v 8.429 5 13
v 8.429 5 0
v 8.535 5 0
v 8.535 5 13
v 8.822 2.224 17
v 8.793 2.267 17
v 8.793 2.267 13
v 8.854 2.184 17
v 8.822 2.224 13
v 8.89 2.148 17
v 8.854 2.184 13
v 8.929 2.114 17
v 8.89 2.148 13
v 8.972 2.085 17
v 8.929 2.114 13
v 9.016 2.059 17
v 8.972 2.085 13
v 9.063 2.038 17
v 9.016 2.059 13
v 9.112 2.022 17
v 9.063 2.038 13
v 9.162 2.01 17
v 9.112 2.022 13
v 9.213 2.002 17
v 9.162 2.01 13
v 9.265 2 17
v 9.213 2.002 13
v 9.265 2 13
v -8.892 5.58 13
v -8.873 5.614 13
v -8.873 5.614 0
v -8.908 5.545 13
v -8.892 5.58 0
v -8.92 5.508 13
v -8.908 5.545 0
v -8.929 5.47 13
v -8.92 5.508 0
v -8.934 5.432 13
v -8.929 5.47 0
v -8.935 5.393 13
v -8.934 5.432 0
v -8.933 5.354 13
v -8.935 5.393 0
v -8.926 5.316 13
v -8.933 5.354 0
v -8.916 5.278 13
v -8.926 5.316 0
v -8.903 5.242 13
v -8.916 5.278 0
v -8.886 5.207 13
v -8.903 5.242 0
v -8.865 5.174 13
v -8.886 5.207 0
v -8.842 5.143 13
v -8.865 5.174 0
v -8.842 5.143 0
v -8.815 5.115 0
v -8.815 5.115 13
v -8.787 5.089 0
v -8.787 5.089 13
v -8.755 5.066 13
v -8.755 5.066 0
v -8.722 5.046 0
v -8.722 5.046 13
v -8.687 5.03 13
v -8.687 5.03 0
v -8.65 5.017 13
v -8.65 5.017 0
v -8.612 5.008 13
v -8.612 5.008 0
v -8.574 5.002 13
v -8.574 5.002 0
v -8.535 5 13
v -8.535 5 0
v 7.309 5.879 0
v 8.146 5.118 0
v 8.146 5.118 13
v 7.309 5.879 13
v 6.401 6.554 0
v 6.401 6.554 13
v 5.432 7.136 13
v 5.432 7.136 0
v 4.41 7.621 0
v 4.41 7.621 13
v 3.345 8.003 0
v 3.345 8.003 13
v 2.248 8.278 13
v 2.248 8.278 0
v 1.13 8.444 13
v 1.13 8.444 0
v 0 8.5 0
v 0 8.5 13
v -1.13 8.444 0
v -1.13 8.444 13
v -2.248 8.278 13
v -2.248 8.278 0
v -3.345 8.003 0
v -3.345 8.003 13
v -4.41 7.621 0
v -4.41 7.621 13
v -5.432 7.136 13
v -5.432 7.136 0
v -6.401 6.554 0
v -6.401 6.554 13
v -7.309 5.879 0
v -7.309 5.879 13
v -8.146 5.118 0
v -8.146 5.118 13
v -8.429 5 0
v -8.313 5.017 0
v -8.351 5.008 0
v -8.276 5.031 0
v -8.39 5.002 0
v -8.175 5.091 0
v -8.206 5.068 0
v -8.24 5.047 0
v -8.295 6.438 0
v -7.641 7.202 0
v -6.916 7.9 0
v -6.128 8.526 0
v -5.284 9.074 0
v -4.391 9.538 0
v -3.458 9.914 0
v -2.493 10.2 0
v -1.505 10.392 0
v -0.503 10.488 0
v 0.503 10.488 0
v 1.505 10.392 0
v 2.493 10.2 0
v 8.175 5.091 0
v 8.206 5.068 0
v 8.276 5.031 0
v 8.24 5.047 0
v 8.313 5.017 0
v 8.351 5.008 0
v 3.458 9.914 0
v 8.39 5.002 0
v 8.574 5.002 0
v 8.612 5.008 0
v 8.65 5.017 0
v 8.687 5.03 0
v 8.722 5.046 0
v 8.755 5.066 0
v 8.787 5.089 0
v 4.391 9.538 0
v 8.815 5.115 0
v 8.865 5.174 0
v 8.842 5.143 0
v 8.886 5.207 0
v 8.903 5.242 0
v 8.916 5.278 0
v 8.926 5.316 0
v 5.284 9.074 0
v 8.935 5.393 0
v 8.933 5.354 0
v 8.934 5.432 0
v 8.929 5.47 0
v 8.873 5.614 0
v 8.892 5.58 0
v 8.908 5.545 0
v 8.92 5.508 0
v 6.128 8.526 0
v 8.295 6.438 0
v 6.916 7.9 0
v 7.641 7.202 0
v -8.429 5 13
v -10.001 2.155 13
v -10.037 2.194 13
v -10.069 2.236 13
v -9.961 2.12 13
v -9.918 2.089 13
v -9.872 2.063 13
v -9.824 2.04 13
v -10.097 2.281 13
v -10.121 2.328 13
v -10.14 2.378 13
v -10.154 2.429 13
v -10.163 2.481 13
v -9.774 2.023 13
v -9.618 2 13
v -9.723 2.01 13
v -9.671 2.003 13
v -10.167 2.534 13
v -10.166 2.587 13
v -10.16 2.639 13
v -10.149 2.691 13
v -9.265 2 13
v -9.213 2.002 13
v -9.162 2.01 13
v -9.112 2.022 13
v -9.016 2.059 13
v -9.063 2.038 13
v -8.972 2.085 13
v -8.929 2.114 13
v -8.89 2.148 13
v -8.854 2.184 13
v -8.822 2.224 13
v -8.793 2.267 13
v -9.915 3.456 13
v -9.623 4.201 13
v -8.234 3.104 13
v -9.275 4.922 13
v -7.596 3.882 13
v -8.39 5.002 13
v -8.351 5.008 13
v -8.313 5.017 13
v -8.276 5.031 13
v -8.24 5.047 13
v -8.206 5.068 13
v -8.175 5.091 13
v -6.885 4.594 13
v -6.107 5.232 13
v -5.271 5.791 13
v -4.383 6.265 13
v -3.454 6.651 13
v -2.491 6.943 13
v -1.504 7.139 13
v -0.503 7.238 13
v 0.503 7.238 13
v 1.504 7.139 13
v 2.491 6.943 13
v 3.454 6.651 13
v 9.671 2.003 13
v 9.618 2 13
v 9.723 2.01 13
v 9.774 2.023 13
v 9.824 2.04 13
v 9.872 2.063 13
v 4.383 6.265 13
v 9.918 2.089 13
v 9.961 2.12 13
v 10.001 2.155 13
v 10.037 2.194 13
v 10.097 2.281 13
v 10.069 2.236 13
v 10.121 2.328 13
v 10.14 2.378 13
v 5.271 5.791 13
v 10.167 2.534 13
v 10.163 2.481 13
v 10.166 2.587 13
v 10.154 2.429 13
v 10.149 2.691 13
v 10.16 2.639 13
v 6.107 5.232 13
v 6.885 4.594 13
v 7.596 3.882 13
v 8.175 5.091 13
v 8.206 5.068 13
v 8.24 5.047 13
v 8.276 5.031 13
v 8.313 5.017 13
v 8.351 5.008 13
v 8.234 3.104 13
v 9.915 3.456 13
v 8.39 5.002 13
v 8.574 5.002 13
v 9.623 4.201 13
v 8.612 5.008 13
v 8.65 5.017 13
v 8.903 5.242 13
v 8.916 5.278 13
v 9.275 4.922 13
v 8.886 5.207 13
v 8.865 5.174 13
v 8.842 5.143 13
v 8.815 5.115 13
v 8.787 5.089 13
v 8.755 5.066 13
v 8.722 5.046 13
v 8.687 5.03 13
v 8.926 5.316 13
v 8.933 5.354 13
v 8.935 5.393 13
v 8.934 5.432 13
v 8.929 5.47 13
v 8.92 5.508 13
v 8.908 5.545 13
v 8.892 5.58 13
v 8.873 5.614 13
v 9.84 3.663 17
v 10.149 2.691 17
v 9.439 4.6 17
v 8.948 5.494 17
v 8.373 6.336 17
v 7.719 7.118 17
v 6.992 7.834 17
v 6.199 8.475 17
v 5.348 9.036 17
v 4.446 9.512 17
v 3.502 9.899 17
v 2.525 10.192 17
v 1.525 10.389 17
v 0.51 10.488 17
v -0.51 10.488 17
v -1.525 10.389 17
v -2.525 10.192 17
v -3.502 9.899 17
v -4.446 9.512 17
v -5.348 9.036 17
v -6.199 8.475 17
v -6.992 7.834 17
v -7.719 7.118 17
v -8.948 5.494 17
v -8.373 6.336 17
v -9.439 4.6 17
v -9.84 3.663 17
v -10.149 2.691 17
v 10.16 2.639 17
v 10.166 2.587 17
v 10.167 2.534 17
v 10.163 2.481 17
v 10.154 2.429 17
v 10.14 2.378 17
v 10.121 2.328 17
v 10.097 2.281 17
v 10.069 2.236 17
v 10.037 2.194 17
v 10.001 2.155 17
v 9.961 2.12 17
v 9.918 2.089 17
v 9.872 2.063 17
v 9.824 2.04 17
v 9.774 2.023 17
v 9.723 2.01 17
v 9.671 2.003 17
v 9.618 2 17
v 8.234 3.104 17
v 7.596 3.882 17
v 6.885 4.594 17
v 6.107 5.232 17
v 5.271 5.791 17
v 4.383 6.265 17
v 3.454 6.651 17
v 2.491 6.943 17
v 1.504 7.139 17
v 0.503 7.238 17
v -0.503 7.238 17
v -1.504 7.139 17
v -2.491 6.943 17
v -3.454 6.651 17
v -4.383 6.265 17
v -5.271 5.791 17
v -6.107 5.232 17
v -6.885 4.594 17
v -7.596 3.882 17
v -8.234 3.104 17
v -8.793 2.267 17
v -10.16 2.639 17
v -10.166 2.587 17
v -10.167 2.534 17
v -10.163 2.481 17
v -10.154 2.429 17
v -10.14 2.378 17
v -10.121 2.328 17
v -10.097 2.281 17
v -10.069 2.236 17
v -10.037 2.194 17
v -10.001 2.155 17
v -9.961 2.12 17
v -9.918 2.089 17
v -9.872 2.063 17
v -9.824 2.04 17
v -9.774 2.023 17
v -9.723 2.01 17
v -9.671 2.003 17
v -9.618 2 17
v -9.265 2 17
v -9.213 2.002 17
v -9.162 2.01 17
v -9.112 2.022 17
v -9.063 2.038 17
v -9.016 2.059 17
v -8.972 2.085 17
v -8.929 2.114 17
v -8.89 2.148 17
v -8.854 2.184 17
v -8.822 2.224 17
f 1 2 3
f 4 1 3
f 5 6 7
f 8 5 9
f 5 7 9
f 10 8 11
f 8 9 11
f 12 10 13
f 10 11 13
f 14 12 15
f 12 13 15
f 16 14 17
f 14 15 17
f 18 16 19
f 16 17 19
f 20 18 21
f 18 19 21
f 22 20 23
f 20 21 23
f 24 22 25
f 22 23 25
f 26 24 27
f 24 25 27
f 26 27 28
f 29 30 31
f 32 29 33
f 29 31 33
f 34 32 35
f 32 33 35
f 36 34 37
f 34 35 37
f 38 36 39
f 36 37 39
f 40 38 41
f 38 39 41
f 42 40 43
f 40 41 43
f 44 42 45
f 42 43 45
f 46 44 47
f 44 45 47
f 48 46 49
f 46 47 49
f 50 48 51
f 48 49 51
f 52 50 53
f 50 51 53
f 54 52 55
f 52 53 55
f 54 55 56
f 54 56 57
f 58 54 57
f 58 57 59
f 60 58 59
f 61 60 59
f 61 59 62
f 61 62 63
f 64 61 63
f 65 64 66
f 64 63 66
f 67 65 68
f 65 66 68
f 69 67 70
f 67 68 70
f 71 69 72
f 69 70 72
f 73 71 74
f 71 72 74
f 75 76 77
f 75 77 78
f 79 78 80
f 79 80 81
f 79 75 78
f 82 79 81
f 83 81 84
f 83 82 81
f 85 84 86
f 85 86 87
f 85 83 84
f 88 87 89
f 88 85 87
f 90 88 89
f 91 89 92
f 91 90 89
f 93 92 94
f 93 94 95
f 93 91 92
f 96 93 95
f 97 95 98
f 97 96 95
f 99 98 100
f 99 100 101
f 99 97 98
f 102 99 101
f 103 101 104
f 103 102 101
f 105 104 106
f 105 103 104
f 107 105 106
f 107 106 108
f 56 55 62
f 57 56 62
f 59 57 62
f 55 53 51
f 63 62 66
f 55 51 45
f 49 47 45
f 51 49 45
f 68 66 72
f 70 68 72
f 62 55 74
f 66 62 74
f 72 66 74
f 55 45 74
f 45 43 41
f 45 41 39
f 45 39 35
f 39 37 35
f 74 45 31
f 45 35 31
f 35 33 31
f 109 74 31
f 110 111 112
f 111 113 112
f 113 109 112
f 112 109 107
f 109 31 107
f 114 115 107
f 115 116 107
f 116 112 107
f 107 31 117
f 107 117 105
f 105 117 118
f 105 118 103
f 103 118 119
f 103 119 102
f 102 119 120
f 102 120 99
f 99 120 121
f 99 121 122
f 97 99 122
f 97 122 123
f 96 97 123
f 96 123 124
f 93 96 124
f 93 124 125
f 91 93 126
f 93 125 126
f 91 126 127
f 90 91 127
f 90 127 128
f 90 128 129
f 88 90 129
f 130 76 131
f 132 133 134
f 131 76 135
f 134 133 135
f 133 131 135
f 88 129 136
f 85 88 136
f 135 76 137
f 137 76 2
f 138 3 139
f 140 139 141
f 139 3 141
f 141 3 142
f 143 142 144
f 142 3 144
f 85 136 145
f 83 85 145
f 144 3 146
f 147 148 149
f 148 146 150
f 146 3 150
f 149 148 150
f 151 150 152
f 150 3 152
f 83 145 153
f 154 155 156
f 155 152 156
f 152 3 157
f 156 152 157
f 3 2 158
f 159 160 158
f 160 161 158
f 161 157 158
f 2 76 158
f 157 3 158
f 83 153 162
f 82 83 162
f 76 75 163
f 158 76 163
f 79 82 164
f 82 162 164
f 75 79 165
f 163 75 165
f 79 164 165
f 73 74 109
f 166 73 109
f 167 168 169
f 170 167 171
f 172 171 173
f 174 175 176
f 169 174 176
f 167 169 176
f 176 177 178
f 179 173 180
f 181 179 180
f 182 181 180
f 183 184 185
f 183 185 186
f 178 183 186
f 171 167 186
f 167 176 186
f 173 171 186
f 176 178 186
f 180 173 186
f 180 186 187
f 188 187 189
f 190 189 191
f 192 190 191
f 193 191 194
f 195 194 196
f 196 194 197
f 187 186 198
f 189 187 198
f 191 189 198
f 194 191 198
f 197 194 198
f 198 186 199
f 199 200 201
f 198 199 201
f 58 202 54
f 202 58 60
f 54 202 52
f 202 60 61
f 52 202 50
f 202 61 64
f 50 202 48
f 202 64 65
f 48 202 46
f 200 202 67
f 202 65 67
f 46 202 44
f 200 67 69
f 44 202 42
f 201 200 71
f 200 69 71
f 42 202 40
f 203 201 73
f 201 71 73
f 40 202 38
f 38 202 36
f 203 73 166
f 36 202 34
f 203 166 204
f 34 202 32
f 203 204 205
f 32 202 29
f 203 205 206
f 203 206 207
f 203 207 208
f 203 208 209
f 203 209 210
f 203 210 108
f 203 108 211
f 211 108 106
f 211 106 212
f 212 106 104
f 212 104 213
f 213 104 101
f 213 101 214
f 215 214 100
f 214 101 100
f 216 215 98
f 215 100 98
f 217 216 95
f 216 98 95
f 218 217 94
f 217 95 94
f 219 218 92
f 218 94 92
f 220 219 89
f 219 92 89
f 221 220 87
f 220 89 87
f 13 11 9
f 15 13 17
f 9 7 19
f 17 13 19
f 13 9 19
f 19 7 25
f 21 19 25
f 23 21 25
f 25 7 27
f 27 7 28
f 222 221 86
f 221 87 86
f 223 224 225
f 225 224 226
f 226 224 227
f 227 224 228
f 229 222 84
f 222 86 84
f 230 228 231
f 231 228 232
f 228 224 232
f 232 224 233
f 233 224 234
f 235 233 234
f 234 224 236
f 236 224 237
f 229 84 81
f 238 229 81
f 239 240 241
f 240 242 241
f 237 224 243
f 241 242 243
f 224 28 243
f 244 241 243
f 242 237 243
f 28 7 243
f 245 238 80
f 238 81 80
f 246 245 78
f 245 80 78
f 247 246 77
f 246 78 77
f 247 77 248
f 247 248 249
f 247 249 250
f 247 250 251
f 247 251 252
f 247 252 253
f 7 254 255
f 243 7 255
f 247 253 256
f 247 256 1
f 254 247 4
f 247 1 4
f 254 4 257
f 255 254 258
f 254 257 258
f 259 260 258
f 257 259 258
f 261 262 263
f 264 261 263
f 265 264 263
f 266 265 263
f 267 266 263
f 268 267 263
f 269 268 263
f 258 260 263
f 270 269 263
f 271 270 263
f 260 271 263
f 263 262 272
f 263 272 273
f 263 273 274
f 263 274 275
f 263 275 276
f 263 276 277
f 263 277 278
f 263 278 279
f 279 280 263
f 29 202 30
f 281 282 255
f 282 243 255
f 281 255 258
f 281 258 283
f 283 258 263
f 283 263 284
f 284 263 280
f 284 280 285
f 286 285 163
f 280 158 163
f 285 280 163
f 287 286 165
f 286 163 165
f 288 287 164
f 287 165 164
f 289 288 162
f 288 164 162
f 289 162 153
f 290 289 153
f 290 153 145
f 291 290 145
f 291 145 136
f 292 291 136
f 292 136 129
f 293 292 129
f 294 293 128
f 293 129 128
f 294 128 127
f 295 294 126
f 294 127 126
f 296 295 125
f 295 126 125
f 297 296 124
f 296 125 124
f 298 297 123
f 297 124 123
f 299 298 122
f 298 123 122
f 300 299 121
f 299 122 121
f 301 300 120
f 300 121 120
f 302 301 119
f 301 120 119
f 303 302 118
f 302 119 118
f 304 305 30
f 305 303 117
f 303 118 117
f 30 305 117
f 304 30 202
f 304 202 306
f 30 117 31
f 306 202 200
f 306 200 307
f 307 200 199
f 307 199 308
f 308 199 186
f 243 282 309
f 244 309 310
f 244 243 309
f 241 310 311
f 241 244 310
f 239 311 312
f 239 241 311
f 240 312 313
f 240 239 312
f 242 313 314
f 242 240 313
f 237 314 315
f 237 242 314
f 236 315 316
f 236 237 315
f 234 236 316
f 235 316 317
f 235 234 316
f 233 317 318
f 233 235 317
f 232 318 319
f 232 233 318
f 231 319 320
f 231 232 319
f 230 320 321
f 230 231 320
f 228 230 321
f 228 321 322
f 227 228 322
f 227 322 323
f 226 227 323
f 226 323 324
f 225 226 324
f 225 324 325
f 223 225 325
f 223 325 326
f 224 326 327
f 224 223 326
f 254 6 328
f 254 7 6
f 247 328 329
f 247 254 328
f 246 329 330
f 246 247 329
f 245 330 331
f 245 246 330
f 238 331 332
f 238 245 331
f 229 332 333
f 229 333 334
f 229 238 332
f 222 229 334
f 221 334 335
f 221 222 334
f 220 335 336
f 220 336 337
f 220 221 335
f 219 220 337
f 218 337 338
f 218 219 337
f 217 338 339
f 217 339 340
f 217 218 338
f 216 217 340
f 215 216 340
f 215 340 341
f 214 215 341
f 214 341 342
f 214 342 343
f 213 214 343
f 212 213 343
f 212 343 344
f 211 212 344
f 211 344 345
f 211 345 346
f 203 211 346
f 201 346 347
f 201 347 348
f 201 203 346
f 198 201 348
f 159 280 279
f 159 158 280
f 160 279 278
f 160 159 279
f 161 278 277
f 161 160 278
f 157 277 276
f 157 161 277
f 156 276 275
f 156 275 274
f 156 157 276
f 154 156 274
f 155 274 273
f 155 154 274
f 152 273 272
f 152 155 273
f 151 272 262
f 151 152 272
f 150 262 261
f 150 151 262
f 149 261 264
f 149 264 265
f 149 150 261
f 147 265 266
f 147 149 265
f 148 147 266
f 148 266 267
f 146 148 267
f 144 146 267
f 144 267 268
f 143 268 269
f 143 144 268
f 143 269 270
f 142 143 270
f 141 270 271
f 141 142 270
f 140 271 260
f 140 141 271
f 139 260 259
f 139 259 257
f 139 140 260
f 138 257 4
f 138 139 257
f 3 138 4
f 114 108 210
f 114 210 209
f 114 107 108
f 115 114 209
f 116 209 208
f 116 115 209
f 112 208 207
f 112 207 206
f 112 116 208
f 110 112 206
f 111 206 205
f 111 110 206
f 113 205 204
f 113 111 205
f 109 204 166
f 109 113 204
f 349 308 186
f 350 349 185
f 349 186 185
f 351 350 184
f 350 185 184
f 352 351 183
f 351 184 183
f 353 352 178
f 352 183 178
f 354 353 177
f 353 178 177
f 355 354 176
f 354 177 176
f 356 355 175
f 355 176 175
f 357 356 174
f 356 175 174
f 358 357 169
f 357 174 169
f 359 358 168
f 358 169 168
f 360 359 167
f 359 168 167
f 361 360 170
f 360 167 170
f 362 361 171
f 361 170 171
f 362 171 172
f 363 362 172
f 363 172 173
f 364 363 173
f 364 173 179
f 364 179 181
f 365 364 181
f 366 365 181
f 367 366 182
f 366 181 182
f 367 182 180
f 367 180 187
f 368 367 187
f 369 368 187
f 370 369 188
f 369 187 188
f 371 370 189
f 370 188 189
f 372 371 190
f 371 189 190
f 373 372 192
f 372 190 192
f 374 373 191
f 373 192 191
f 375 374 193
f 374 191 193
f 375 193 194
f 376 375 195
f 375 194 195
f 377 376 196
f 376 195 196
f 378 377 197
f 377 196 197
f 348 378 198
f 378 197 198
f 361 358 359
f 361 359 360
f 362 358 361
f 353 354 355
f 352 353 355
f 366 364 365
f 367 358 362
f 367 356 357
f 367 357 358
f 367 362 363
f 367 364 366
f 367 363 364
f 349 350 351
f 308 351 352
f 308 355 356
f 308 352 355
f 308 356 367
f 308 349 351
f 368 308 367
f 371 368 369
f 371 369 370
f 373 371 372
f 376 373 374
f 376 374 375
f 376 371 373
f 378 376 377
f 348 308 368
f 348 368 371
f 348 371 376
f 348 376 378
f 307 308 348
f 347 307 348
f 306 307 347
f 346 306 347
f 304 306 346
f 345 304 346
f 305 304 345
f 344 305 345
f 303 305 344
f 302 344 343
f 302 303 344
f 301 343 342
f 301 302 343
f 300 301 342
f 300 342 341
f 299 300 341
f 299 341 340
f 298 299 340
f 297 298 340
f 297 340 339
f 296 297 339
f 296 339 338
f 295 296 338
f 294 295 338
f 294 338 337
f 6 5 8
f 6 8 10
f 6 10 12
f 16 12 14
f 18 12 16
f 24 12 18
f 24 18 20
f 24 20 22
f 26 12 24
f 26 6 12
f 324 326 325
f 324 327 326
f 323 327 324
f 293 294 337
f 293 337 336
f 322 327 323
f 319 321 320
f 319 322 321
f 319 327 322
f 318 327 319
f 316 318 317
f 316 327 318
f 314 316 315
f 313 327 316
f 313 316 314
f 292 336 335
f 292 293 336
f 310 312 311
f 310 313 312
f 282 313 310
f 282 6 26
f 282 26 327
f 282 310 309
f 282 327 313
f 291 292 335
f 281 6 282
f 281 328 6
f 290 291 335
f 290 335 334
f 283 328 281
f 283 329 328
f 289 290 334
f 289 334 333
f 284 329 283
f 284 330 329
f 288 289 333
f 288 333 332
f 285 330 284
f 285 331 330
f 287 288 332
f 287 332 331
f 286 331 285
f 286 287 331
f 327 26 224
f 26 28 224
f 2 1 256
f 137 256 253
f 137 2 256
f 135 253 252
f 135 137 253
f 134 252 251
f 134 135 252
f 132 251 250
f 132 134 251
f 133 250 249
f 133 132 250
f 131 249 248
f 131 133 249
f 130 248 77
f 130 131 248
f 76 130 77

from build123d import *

# Parameters (mm, degrees)
BOX002_W          = 30
BOX002_H          = 10
BOX002_DEPTH      = 13
BOX001_W          = 30
BOX001_H          = 10
BOX001_DEPTH      = 17
CYLINDER_R        = 10.5
CYLINDER_DEPTH    = 20
CYLINDER001_R     = 20
CYLINDER001_DEPTH = 20
CYLINDER003_R     = 10.25
CYLINDER003_DEPTH = 17
CYLINDER002_R     = 11.5
CYLINDER002_DEPTH = 13
BOX_W             = 26
BOX_H             = 15
BOX_DEPTH         = 17
FILLET_R          = 0.4
FILLET001_R       = 0.55
FILLET002_R       = 0.55


with BuildPart() as cube002:
    # Box002 → Box002 (new body)
    with BuildSketch(Plane(origin=(-15, -5, 0), x_dir=(1, 0, 0), z_dir=(0, 0, 1))):
        with Locations((15, 5)):
            Rectangle(BOX002_W, BOX002_H)
    extrude(amount=BOX002_DEPTH)


with BuildPart() as cube001:
    # Box001 → Box001 (new body)
    with BuildSketch(Plane(origin=(-15, -8, 0), x_dir=(1, 0, 0), z_dir=(0, 0, 1))):
        with Locations((15, 5)):
            Rectangle(BOX001_W, BOX001_H)
    extrude(amount=BOX001_DEPTH)


with BuildPart() as ajustar_este:
    # Cylinder → Cylinder (new body)
    with BuildSketch(Plane.XY):
        Circle(CYLINDER_R)
    extrude(amount=CYLINDER_DEPTH)


with BuildPart() as cut:
    # Cylinder001 → Cylinder001 (new body)
    with BuildSketch(Plane.XY):
        Circle(CYLINDER001_R)
    extrude(amount=CYLINDER001_DEPTH)

    # Cut: cut ajustar_este
    add(ajustar_este.part, mode=Mode.SUBTRACT)


with BuildPart() as cylinder003:
    # Cylinder003 → Cylinder003 (new body)
    with BuildSketch(Plane(origin=(0, -3, 0), x_dir=(1, 0, 0), z_dir=(0, 0, 1))):
        Circle(CYLINDER003_R)
    extrude(amount=CYLINDER003_DEPTH)


with BuildPart() as fusion:
    # Cylinder002 → Cylinder002 (new body)
    with BuildSketch(Plane(origin=(0, -3, 0), x_dir=(1, 0, 0), z_dir=(0, 0, 1))):
        Circle(CYLINDER002_R)
    extrude(amount=CYLINDER002_DEPTH)

    # Fusion: union Cylinder003
    add(cylinder003.part)


with BuildPart() as fillet002:
    # Box → Box (new body)
    with BuildSketch(Plane(origin=(-13, -2, 0), x_dir=(1, 0, 0), z_dir=(0, 0, 1))):
        with Locations((13, 7.5)):
            Rectangle(BOX_W, BOX_H)
    extrude(amount=BOX_DEPTH)

    # Cut001: cut Fusion
    add(fusion.part, mode=Mode.SUBTRACT)

    # Cut002: cut Cut
    add(cut.part, mode=Mode.SUBTRACT)

    # Cut002003: cut Cube001
    add(cube001.part, mode=Mode.SUBTRACT)

    # Cut002004: cut Cube002
    add(cube002.part, mode=Mode.SUBTRACT)

    # Fillet
    fillet_edges = [fillet002.edges().sort_by_distance(p)[0] for p in [
        (-9.233093, 5, 6.5),
        (9.233093, 5, 6.5),
        (-8.261356, 5, 6.5),
        (8.261356, 5, 6.5),
    ]]
    fillet(fillet_edges, radius=FILLET_R)

    # Fillet001
    fillet001_edges = [fillet002.edges().sort_by_distance(p)[0] for p in [
        (10.307764, 2, 15),
        (8.947765, 2, 15),
    ]]
    fillet(fillet001_edges, radius=FILLET001_R)

    # Fillet002
    fillet002_edges = [fillet002.edges().sort_by_distance(p)[0] for p in [
        (-10.307764, 2, 15),
        (-8.947765, 2, 15),
    ]]
    fillet(fillet002_edges, radius=FILLET002_R)


solid = fillet002.part
